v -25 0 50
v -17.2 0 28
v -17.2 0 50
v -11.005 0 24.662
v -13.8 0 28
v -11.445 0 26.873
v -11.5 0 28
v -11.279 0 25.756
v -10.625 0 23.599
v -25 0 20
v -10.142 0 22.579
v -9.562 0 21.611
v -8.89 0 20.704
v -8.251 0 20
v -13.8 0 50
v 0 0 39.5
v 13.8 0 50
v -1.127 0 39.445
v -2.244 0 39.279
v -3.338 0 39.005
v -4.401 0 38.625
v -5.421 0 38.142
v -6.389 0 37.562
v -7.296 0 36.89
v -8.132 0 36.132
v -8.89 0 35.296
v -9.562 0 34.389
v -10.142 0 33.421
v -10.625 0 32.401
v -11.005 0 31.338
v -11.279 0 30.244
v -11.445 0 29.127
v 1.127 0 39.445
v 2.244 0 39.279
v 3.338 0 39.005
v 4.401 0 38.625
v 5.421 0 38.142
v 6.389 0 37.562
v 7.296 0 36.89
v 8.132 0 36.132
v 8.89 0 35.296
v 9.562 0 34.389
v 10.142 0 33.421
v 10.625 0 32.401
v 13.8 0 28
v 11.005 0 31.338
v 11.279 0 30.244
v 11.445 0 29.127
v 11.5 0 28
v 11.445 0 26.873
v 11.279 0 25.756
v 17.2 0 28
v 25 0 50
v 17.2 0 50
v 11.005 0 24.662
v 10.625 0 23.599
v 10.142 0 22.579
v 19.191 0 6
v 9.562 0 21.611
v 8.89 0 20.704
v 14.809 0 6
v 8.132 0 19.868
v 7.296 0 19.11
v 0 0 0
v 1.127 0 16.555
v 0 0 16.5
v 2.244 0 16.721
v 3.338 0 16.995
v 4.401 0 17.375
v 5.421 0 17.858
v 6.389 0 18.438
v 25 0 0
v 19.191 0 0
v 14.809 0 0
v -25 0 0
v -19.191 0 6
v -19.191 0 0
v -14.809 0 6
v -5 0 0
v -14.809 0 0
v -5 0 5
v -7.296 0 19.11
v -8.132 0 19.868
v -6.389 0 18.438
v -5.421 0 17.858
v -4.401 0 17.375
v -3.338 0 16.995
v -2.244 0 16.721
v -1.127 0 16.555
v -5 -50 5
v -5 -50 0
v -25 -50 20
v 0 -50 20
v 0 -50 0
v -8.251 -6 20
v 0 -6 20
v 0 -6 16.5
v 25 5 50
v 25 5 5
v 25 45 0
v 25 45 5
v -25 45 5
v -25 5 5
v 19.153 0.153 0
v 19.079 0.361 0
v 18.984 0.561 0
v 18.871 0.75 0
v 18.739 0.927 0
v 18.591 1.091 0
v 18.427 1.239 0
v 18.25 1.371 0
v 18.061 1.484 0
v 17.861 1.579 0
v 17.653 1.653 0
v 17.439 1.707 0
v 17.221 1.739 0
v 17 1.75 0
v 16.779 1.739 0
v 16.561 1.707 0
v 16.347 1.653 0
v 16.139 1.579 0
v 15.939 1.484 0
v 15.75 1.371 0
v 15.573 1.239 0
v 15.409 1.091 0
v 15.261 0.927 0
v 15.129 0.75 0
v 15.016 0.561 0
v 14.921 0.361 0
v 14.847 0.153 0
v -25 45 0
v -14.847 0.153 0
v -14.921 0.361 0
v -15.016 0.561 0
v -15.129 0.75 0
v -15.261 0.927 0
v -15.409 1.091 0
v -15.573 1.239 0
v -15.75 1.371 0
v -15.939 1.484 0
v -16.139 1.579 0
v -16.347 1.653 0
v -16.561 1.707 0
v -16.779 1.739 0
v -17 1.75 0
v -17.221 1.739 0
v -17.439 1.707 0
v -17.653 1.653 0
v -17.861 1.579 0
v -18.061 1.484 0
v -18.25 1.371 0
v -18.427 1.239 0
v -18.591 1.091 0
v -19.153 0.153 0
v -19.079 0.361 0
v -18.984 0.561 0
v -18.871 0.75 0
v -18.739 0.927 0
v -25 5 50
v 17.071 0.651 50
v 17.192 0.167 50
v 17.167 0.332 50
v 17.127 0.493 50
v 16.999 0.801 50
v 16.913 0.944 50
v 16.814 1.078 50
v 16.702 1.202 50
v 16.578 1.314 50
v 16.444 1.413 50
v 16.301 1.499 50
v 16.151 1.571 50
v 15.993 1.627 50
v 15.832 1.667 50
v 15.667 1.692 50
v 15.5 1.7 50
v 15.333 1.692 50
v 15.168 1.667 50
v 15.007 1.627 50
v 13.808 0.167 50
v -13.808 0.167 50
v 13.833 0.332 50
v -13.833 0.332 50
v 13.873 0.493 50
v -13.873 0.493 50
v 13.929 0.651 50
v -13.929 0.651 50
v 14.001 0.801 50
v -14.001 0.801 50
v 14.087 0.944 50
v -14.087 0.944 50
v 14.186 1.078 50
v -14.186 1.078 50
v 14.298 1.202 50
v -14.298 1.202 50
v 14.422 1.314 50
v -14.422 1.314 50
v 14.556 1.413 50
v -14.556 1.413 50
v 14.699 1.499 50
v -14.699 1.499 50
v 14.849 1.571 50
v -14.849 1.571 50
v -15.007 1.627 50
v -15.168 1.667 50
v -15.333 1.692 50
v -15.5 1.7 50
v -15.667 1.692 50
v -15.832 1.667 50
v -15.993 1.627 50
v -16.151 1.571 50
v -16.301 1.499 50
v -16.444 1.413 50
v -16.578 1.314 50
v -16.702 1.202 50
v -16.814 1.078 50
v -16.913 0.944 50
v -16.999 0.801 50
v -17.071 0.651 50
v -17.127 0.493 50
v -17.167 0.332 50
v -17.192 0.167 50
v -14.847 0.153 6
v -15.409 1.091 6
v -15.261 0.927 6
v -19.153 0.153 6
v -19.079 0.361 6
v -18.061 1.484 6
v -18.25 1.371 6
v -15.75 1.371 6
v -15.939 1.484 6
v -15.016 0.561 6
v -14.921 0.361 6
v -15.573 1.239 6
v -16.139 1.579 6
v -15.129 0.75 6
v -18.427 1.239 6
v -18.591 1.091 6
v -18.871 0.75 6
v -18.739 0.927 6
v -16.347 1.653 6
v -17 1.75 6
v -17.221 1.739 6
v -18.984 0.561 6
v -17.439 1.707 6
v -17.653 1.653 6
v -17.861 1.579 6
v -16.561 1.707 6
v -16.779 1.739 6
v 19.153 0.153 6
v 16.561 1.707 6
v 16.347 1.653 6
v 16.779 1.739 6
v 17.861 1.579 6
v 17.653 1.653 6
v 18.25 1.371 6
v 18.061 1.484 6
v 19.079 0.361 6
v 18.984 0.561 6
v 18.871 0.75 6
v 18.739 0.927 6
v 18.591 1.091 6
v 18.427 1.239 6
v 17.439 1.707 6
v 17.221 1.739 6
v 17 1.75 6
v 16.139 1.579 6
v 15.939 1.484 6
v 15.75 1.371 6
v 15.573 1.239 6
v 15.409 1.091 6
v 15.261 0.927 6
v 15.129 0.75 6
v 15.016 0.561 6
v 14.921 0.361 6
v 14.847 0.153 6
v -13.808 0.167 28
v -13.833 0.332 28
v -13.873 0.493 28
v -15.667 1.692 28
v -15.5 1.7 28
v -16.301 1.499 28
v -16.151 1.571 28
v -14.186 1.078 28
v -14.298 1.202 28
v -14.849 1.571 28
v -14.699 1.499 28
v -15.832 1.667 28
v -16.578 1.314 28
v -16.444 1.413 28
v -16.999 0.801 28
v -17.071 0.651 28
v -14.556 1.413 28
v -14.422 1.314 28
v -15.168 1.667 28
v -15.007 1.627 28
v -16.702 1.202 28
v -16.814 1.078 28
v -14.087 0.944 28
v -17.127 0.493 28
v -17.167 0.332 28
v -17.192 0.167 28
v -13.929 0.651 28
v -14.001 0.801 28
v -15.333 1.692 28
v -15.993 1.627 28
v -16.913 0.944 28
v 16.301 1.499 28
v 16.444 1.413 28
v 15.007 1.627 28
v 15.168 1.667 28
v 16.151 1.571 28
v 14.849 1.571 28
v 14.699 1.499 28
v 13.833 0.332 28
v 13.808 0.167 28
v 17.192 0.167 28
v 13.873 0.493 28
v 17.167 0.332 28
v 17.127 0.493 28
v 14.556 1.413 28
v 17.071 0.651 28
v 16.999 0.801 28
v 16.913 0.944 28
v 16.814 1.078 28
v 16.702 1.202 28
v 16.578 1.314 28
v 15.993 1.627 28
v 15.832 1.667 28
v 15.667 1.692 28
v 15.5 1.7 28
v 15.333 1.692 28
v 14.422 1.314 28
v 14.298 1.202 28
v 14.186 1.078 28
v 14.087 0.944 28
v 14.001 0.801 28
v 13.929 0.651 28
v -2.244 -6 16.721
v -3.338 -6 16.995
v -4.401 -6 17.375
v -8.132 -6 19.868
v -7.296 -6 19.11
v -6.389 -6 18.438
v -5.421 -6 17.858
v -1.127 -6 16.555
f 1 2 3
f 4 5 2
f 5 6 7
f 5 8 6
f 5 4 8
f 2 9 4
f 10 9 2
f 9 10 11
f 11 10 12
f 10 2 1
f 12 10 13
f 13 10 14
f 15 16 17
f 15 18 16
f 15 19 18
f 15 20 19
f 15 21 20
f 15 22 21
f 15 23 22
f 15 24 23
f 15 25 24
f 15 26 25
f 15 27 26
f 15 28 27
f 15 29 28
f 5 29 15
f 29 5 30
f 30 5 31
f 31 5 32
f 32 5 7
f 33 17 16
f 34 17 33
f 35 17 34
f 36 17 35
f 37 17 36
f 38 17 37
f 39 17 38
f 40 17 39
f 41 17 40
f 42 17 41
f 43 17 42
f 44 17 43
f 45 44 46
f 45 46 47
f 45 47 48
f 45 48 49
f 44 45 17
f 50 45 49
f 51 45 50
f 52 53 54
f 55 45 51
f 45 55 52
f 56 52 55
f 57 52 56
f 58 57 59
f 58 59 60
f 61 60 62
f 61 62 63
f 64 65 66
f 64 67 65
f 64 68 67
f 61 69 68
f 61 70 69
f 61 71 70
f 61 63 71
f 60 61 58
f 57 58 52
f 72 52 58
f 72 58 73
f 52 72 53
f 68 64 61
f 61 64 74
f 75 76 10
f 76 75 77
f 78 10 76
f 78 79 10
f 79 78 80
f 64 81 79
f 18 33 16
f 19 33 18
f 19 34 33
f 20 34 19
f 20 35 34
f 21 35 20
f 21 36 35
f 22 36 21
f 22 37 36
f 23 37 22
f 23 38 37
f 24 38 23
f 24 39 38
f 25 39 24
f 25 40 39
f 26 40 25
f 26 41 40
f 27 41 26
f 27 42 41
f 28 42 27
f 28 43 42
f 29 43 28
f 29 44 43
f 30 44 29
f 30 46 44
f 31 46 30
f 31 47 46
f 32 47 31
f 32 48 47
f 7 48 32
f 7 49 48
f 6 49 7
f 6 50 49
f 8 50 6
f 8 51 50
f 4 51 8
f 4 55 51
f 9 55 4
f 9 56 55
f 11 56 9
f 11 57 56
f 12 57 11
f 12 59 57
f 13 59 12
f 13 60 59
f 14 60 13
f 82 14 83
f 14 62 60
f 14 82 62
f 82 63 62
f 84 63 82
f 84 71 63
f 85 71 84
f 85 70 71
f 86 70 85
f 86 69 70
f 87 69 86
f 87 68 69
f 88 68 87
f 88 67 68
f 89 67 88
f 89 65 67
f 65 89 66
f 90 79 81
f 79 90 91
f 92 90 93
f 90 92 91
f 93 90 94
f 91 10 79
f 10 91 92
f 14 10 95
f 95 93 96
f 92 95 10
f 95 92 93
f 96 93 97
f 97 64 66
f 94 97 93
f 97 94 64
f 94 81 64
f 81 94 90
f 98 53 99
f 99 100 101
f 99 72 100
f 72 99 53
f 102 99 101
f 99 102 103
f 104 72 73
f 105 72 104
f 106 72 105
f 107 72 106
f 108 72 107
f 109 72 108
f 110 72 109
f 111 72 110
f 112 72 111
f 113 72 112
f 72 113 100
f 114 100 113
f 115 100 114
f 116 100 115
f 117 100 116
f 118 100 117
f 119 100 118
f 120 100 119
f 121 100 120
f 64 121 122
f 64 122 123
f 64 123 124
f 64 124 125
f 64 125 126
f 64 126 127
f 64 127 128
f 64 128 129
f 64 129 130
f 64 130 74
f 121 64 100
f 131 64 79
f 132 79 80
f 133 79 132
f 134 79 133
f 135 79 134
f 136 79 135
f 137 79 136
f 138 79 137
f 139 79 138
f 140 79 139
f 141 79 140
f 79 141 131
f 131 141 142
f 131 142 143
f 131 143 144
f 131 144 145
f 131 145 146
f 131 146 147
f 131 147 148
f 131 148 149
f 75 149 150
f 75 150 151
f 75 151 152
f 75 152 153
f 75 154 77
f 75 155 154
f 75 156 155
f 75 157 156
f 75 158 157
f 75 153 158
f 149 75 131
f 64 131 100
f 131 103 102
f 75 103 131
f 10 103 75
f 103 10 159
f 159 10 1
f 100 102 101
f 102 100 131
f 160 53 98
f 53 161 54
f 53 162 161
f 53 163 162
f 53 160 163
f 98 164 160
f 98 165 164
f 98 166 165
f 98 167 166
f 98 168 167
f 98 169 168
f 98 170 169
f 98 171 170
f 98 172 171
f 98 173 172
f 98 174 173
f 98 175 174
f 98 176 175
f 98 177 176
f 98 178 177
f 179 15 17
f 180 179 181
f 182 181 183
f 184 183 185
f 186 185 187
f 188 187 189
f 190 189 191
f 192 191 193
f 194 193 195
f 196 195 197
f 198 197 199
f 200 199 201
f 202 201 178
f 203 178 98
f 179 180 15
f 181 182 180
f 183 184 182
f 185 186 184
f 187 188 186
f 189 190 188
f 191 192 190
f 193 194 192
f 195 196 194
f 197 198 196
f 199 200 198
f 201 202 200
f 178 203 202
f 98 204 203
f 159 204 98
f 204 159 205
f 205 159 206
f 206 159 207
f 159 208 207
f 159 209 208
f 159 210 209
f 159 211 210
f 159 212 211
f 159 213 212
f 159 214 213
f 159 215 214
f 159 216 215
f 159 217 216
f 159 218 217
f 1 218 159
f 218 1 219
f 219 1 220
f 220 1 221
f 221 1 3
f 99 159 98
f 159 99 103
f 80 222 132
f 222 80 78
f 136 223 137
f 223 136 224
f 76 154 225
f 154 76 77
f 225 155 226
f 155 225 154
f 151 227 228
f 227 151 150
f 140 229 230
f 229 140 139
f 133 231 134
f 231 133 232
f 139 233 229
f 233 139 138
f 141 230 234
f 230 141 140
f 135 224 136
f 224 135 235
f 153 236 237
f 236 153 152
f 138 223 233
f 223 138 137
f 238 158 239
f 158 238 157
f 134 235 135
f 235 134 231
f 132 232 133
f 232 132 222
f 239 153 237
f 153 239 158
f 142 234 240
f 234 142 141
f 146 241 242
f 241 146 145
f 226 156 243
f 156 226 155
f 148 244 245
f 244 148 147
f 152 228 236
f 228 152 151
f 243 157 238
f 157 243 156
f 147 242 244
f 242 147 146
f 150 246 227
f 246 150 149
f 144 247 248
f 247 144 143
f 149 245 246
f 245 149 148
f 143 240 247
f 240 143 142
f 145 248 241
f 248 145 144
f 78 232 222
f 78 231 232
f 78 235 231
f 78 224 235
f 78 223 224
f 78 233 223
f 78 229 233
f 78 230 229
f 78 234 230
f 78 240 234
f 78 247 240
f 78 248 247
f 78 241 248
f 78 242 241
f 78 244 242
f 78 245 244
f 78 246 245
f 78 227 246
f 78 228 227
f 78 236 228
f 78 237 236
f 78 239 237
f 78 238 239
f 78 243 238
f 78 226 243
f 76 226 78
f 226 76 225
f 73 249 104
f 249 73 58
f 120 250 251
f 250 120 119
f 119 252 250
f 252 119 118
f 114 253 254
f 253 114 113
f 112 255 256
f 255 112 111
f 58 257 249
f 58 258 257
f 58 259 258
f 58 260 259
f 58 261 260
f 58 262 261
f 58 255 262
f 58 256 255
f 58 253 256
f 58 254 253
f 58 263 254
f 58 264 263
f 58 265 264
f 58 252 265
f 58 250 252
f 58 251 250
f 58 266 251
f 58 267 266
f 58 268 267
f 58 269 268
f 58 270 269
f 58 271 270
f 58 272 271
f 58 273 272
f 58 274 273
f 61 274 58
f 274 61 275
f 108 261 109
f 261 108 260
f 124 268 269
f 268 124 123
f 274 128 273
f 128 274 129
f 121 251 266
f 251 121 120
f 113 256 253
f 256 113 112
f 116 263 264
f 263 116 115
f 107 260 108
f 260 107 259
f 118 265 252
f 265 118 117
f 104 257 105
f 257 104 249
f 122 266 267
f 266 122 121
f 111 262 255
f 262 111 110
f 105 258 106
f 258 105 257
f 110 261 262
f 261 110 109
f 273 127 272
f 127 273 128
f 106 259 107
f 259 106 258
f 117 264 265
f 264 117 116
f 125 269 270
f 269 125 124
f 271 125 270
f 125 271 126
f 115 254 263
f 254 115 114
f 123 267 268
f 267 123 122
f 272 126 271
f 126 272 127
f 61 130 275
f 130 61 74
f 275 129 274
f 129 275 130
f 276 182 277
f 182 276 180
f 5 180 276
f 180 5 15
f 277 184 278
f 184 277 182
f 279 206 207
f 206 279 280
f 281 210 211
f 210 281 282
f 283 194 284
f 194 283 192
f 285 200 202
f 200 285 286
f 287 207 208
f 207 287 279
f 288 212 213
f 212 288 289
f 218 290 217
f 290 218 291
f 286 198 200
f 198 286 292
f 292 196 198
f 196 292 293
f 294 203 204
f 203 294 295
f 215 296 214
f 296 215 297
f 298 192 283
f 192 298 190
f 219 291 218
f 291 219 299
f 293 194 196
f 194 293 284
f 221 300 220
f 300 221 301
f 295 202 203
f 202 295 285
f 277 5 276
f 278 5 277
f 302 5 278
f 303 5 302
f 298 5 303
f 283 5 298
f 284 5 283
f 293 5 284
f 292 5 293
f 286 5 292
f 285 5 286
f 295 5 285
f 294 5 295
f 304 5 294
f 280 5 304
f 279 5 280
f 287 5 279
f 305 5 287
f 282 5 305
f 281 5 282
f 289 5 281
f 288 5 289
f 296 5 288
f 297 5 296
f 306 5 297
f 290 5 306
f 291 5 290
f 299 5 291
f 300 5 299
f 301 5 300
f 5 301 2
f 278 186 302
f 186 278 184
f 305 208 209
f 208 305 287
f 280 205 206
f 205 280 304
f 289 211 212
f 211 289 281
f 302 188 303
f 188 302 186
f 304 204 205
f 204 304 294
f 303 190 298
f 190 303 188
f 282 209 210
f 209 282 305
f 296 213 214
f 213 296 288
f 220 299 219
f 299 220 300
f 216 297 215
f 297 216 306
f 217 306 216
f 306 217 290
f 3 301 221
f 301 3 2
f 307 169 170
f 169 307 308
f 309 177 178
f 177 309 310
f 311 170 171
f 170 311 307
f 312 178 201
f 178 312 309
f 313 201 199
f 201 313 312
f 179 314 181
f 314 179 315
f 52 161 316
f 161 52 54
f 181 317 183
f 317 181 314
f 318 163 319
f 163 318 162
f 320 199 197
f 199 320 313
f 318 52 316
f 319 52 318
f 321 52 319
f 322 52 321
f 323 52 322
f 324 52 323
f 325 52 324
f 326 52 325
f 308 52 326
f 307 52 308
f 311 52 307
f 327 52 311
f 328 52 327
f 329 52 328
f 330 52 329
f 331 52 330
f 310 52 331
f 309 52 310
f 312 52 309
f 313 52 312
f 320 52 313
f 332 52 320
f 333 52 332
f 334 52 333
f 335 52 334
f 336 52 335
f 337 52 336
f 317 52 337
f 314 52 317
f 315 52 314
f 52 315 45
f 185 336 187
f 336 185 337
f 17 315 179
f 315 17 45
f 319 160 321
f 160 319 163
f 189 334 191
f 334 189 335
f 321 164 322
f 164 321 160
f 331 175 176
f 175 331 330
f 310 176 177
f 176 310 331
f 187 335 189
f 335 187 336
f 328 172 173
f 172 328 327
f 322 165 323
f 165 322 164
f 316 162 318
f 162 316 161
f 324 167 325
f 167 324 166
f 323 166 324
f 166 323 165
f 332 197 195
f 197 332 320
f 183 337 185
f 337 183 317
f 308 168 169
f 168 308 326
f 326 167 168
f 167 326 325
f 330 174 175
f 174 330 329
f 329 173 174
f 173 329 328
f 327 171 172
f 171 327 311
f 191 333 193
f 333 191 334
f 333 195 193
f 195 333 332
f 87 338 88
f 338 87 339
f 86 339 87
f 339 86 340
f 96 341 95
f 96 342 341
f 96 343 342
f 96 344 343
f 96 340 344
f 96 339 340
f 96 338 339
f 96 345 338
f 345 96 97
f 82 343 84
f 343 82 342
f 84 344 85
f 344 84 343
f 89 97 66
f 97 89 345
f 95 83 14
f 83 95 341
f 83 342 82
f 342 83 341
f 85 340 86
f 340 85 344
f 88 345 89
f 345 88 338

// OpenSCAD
// L-shaped mounting bracket for NEMA 17 stepper motor (e.g. syringe pump)
// Print orientation: base plate on bed, motor plate builds upward (+Z)

$fn = 64;

// ---- Base plate ----
base_x_min = -25;   // base plate X start
base_x_max = 25;    // base plate X end
base_y_min = 0;     // base plate Y start
base_y_max = 45;    // base plate Y end
base_z_max = 5;     // base plate thickness

// ---- Motor plate ----
motor_x_min = -25;  // motor plate X start
motor_x_max = 25;  // motor plate X end
motor_y_max = 5;   // motor plate thickness (Y)
motor_z_max = 50;  // motor plate height (Z)

// ---- Boss hole (motor centring) ----
boss_d = 23;        // boss hole diameter
boss_x = 0;         // boss hole X centre
boss_z = 28;        // boss hole Z centre

// ---- Screw holes (M3) ----
screw_d = 3.4;      // screw hole diameter
screw_pitch = 31;   // square pattern side length

// ---- Gussets ----
gusset_x_min = -25; // gusset X start (left edge)
gusset_x_end = -20; // gusset X end
gusset_leg = 20;    // triangle leg length (Y and Z)

// ---- Cutting overlap ----
eps = 0.5;          // extension past cut faces

difference() {
    union() {
        // Base plate
        translate([base_x_min, base_y_min, 0])
            cube([base_x_max - base_x_min, base_y_max - base_y_min, base_z_max]);

        // Motor plate, standing on back edge of base
        translate([motor_x_min, motor_y_max - motor_y_max, 0])
            cube([motor_x_max - motor_x_min, motor_y_max, motor_z_max]);

        // Gussets, flush with left and right edges
        for (sx = [-1, 1])
            translate([sx > 0 ? gusset_x_end : gusset_x_min, 0, 0])
                rotate([90, 0, 0])
                    linear_extrude(height = motor_x_max - motor_x_min)
                        polygon([[gusset_leg, gusset_leg], [0, gusset_leg], [gusset_leg, 0]]);
    }

    // Base plate through-holes (M4)
    for (bx = [-17, 17])
        translate([bx, base_y_min - eps, 0])
            cylinder(d = 4.5, h = base_z_max + 2 * eps);

    // Boss hole along Y
    translate([boss_x, 0, boss_z])
        rotate([90, 0, 0])
            cylinder(d = boss_d, h = motor_y_max + 2 * eps);

    // M3 screw holes on square pattern centred on boss hole
    for (a = [0, 90, 180, 270])
        rotate([0, 0, a])
            translate([boss_x - screw_pitch / 2, 0, boss_z])
                cylinder(d = screw_d, h = motor_z_max + eps);
}
